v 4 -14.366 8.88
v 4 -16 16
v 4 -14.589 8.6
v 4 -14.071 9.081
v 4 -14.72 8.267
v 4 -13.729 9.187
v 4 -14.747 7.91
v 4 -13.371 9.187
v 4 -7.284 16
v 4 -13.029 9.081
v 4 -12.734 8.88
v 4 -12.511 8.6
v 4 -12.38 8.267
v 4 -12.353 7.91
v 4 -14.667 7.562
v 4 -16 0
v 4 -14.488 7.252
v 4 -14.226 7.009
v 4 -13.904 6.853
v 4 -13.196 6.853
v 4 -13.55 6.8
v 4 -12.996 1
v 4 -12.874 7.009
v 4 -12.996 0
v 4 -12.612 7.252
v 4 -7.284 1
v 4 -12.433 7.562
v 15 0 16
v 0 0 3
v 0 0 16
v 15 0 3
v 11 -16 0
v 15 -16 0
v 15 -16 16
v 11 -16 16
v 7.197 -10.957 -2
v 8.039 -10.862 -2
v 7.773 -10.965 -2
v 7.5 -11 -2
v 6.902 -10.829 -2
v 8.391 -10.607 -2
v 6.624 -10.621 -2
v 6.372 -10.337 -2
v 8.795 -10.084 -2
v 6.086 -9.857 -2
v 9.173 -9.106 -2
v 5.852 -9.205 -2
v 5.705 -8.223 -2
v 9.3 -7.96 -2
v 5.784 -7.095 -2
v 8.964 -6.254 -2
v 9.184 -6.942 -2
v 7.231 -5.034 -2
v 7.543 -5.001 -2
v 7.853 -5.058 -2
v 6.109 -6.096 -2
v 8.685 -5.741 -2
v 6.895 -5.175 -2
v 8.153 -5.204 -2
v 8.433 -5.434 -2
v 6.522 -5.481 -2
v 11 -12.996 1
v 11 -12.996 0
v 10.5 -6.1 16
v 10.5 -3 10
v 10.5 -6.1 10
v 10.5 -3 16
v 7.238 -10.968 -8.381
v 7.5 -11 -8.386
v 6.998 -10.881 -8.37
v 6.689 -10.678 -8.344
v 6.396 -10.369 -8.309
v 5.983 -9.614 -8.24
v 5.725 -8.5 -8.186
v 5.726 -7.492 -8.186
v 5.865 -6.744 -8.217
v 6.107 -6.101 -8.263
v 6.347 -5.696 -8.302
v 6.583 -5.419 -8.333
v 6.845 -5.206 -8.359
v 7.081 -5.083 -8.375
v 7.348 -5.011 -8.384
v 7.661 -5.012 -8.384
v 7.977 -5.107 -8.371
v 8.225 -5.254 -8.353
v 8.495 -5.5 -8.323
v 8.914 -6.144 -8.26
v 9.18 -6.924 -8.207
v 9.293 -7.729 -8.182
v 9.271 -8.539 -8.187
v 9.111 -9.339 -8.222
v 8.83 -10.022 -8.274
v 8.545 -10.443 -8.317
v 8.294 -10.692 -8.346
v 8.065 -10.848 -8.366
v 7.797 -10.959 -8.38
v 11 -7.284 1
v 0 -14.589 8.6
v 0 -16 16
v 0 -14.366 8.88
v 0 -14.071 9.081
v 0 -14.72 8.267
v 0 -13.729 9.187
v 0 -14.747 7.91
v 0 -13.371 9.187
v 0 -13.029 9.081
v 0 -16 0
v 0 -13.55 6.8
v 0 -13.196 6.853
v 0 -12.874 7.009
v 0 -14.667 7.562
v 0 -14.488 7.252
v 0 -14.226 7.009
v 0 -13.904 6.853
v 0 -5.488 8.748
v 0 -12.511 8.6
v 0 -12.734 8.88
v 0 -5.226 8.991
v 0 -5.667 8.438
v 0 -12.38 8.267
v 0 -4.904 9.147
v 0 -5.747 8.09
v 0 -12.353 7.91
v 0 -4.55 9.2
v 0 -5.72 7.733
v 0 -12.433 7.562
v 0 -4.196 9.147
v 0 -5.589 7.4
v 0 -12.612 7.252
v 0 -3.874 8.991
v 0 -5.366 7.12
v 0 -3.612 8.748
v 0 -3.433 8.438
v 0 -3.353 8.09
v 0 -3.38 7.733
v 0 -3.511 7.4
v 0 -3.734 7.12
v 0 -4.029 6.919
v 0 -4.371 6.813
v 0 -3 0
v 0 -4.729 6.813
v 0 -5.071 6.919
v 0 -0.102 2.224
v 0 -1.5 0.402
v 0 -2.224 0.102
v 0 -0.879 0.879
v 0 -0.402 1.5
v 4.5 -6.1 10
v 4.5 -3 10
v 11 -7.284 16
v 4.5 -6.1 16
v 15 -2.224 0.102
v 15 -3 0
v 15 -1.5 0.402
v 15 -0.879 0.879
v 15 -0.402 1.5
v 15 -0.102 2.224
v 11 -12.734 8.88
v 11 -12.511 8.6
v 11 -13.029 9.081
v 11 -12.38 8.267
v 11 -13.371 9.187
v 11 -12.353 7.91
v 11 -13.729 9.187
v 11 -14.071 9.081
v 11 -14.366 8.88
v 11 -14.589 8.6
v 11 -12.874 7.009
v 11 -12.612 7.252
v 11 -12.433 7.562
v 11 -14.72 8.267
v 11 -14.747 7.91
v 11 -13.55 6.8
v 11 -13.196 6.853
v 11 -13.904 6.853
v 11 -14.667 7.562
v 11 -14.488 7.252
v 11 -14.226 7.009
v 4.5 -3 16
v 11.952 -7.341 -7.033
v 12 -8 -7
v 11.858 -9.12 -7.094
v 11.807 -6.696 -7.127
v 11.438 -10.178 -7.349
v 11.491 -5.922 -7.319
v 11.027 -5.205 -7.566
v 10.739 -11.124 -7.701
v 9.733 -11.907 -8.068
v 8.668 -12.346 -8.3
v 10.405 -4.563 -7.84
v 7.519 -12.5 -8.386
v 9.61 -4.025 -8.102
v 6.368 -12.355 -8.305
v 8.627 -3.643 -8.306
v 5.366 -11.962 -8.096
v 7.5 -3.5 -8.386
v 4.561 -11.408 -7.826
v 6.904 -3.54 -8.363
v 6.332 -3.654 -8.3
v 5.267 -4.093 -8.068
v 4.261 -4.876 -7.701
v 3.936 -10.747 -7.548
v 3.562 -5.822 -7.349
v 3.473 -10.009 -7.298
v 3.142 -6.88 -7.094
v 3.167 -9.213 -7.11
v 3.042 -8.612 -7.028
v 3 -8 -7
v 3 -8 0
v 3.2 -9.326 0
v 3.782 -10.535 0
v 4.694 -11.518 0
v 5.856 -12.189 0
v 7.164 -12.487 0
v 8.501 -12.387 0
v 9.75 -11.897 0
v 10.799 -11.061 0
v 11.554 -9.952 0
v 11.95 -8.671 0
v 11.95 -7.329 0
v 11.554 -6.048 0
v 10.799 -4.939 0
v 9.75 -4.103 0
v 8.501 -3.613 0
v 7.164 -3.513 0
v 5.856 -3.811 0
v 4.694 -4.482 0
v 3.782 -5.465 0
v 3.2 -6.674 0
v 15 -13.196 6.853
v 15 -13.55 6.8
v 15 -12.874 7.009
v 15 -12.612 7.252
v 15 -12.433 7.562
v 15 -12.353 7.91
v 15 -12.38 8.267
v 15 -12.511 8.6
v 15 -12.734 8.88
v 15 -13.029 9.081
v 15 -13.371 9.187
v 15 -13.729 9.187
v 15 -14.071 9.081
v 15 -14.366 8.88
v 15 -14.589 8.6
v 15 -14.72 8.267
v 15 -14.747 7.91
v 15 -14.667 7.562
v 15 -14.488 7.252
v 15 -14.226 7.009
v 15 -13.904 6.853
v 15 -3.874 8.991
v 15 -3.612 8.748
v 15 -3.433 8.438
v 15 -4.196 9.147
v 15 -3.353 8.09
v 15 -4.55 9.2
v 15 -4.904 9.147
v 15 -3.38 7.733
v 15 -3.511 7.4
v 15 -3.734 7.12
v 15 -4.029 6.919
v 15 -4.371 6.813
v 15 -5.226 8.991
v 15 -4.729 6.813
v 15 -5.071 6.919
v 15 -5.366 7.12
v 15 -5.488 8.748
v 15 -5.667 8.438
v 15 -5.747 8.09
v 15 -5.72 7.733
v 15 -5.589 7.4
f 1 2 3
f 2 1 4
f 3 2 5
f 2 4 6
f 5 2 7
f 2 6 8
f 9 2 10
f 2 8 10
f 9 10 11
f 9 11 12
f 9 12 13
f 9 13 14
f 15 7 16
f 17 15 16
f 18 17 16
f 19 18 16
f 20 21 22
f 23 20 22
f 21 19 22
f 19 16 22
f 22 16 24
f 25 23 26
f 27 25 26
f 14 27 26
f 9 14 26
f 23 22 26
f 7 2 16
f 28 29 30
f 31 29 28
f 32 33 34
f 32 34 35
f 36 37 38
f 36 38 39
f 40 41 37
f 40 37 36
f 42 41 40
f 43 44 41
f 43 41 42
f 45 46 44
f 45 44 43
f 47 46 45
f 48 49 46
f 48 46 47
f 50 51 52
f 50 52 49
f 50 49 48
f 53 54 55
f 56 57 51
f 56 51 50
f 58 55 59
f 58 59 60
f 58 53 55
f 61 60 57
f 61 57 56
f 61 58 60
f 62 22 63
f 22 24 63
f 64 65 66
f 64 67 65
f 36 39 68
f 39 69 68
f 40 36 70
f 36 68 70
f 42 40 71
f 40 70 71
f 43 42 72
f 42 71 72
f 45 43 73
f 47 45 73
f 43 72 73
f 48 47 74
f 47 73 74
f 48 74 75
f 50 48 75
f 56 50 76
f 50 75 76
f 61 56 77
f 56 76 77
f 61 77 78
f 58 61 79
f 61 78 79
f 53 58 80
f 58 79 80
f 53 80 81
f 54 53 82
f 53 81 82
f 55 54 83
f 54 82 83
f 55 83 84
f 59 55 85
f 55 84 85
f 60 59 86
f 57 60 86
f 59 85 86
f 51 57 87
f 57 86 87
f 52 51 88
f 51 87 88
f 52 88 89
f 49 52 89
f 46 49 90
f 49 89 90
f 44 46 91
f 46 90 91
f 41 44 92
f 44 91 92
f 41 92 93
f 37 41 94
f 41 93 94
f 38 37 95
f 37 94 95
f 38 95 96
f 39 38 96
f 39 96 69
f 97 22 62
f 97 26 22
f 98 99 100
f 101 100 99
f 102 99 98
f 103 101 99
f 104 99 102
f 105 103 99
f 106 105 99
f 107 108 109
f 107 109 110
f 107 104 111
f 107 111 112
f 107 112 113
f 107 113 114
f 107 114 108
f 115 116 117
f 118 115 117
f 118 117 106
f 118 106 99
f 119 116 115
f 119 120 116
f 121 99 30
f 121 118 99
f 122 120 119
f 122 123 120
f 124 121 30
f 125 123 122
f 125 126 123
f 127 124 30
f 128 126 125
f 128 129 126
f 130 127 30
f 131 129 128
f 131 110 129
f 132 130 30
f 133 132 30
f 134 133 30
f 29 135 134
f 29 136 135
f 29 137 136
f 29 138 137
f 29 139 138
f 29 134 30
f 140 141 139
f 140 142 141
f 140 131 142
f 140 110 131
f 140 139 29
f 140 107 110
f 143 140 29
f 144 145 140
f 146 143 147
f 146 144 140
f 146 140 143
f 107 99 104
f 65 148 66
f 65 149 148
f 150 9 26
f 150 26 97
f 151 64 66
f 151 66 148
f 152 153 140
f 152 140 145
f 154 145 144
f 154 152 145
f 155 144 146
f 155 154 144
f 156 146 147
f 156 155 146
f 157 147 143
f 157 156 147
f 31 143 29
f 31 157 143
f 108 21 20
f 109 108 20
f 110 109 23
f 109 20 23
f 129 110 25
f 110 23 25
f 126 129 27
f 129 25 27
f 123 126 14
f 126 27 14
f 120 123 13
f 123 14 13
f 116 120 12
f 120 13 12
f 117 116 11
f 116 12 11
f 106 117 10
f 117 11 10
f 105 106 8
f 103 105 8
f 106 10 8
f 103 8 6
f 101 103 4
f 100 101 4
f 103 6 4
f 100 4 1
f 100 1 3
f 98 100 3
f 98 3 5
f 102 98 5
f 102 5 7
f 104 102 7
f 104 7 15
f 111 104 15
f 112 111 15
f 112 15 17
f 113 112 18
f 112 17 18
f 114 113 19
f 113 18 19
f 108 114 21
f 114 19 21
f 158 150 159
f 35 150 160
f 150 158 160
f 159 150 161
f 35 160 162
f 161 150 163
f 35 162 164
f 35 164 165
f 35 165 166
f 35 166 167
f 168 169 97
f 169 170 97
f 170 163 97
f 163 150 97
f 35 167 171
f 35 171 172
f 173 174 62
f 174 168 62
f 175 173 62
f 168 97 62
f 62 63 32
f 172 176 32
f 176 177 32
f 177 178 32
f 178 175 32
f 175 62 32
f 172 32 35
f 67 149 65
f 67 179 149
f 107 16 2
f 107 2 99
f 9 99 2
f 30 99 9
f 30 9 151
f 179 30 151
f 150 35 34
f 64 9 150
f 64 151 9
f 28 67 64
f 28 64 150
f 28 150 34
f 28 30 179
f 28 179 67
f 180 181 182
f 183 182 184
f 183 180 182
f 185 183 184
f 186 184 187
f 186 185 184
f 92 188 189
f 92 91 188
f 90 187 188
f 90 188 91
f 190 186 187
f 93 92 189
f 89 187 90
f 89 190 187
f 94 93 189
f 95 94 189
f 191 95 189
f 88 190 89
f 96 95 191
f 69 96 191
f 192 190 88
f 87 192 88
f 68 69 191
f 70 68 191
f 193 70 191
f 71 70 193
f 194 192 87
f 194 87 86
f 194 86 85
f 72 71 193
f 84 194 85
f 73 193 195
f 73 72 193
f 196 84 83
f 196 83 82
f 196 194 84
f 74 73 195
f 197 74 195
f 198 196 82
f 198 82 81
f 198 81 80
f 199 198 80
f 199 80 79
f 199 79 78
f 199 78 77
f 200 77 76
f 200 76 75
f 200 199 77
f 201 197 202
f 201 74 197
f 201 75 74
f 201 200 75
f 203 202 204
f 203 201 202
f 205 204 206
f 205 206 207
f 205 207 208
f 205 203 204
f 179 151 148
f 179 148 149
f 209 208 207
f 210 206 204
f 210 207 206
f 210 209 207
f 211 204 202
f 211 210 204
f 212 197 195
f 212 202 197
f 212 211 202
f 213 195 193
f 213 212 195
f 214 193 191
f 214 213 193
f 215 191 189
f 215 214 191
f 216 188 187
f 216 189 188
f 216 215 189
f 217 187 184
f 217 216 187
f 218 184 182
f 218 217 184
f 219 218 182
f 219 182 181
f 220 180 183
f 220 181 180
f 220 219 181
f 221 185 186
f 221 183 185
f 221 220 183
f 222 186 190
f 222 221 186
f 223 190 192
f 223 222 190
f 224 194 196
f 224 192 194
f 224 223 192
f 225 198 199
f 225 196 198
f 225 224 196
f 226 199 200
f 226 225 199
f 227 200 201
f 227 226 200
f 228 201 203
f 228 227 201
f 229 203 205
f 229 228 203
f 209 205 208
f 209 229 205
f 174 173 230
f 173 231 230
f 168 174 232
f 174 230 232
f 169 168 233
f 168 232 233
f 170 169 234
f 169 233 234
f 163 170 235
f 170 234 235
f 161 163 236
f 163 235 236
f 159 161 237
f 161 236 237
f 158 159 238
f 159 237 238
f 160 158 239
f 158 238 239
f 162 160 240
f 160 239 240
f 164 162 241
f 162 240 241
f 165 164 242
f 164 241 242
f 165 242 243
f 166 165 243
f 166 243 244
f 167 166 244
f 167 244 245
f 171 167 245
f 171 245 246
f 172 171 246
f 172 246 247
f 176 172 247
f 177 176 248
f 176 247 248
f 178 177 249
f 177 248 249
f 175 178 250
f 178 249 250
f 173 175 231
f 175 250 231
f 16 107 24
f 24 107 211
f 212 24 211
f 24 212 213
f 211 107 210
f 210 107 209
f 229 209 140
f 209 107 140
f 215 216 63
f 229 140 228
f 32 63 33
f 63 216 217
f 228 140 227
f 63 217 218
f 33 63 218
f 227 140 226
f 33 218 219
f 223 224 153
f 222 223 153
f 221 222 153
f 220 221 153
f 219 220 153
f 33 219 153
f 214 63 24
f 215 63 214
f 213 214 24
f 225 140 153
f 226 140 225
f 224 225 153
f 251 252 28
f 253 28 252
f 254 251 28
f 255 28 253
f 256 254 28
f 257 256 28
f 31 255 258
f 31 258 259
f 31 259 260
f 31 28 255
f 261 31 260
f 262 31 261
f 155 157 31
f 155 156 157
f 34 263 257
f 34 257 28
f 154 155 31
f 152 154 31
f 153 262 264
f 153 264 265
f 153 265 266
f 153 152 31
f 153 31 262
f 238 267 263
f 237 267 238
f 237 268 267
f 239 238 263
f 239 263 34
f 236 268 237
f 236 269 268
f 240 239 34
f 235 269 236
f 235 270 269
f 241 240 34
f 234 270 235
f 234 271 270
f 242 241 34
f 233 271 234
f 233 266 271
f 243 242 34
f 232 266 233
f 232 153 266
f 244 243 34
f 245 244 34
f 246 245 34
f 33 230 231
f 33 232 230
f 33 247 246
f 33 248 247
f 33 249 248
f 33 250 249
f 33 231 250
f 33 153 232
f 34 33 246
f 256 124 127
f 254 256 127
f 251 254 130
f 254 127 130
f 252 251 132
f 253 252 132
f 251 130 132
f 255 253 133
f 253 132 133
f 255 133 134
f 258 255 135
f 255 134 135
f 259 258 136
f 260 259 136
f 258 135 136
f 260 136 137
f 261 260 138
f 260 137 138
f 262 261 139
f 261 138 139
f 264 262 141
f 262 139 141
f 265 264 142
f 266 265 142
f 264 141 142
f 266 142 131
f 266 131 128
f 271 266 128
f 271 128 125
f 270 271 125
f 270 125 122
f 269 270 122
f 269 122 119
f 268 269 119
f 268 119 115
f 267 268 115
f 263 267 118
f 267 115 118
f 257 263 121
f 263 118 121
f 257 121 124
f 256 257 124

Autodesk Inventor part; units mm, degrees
ref_plane "YZ Plane" through (0, 0, 0) normal (1, 0, 0) x (0, 1, 0)
ref_plane "XZ Plane" through (0, 0, 0) normal (0, 1, 0) x (-1, 0, 0)
sketch "Sketch1" plane through (0, 0, 0) normal (0, 0, 1) x (1, 0, 0)
  line L0 (0, 0) -> (15, 0)
  line L1 (15, 0) -> (15, -16)
  line L2 (15, -16) -> (0, -16)
  line L3 (0, -16) -> (0, 0)
  dimension "d0" = 16
  dimension "d1" = 15
extrude "Extrusion1" add sketch "Sketch1" along normal blind 16
sketch "Sketch21" plane through (0, 0, 0) normal (0, 0, -1) x (-1, 0, 0)
  circle A0 centre (-7.5, -8) radius 4.5
  line L0 (0, 0) -> (0, -16) projected
  line L1 (-15, 0) -> (0, 0) projected
  dimension "d2" = 16
  dimension "d89" = 9
  dimension "d90" = 7.5
  dimension "d91" = 8
extrude "Extrusion12" add sketch "Sketch21" along normal blind 10
sketch "Sketch22" plane through (7.5, -8, -10) normal (0, 0, -1) x (-1, 0, 0)
  ellipse E0 centre (0, 0) end of major axis (0, -3) minor radius 1.8
  point P0 (7.5, 8)
  dimension "d2" = 16
  dimension "d94" = 1.8
  dimension "d95" = 3
extrude "Extrusion13" cut sketch "Sketch22" against normal blind 8
ref_plane "Work Plane5" through (7.5, -3.5, 0) normal (0, -1, 0) x (1, 0, 0)
sketch "Sketch24" plane through (7.5, -3.5, 0) normal (0, -1, 0) x (1, 0, 0)
  line L0 (-4.5, -10) -> (4.5, -10) projected
  line L1 (4.5, -10) -> (-4.5, -10)
  line L2 (-4.5, -10) -> (-4.5, -7)
  line L3 (-4.5, 0) -> (-4.5, -10) projected
  line L4 (4.5, -10) -> (4.5, -7)
  line L5 (4.5, 0) -> (4.5, -10) projected
  arc A0 (-4.5, -7) -> (4.5, -7) centre (0, -0.3856) ccw
  point P0 (-7.5, 0)
  dimension "d2" = 16
  dimension "d98" = 3
  dimension "d99" = 3
  dimension "d100" = 8
extrude "Extrusion14" cut sketch "Sketch24" along normal blind 12
sketch "Sketch31" plane through (0, 0, 16) normal (0, 0, 1) x (1, 0, 0)
  line L0 (4.5, -3) -> (10.5, -3)
  line L1 (10.5, -3) -> (10.5, -6.1)
  line L2 (10.5, -6.1) -> (4.5, -6.1)
  line L3 (4.5, -6.1) -> (4.5, -3)
  line L4 (15, -16) -> (15, 0) projected
  line L5 (15, 0) -> (0, 0) projected
  dimension "d2" = 16
  dimension "d130" = 3.1
  dimension "d131" = 6
  dimension "d132" = 4.5
  dimension "d133" = 3
extrude "Extrusion20" cut sketch "Sketch31" against normal blind 6
sketch "Sketch32" plane through (0, 0, 16) normal (0, 0, 1) x (1, 0, 0)
  line L0 (4, -7.284) -> (11, -7.284)
  line L1 (11, -7.284) -> (11, -16.284)
  line L2 (11, -16.284) -> (4, -16.284)
  line L3 (4, -16.284) -> (4, -7.284)
  line L4 (10.5, -6.1) -> (4.5, -6.1) projected
  line L5 (15, -16) -> (15, 0) projected
  point P0 (0, 0)
  dimension "d2" = 16
  dimension "d140" = 7
  dimension "d141" = 1.184
  dimension "d142" = 4
  dimension "d143" = 9
extrude "Extrusion21" cut sketch "Sketch32" against normal blind 15
sketch "Sketch33" plane through (0, -16, 0) normal (-1, 0, 0) x (0, 0, 1)
  circle A0 centre (8, 11.45) radius 1.2
  line L0 (16, 0) -> (16, 16) projected
  point P0 (0, 16)
  dimension "d2" = 16
  dimension "d146" = 2.4
  dimension "d147" = 8
  dimension "d148" = 4.55
extrude "Extrusion22" cut sketch "Sketch33" against normal through all
sketch "Sketch34" plane through (0, 0, 0) normal (0, 0, -1) x (-1, 0, 0)
  line L0 (0, -16) -> (-15, -16) projected
  line L1 (-11, -16) -> (-4, -16)
  line L2 (-4, -16) -> (-4, -12.9958)
  line L3 (-4, -12.9958) -> (-11, -12.9958)
  line L4 (-11, -12.9958) -> (-11, -16)
  line L5 (0, 0) -> (0, -16) projected
  dimension "d2" = 16
  dimension "d151" = 7
  dimension "d152" = 4
extrude "Extrusion23" cut sketch "Sketch34" against normal blind 10
sketch "Sketch35" plane through (15, -16, 0) normal (1, 0, 0) x (0, 0, -1)
  circle A0 centre (-8, 2.45) radius 1.2
  line L0 (0, 0) -> (-16, 0) projected
  line L1 (-16, 0) -> (-16, 16) projected
  point P0 (0, 16)
  dimension "d2" = 16
  dimension "d155" = 2.4
  dimension "d156" = 2.45
  dimension "d157" = 8
extrude "Extrusion24" cut sketch "Sketch35" against normal through all
fillet "Fillet4" radius 3 1 edges at (7.5, 0, 0)
properties part number "korob_3" material "ABS Plastic"
